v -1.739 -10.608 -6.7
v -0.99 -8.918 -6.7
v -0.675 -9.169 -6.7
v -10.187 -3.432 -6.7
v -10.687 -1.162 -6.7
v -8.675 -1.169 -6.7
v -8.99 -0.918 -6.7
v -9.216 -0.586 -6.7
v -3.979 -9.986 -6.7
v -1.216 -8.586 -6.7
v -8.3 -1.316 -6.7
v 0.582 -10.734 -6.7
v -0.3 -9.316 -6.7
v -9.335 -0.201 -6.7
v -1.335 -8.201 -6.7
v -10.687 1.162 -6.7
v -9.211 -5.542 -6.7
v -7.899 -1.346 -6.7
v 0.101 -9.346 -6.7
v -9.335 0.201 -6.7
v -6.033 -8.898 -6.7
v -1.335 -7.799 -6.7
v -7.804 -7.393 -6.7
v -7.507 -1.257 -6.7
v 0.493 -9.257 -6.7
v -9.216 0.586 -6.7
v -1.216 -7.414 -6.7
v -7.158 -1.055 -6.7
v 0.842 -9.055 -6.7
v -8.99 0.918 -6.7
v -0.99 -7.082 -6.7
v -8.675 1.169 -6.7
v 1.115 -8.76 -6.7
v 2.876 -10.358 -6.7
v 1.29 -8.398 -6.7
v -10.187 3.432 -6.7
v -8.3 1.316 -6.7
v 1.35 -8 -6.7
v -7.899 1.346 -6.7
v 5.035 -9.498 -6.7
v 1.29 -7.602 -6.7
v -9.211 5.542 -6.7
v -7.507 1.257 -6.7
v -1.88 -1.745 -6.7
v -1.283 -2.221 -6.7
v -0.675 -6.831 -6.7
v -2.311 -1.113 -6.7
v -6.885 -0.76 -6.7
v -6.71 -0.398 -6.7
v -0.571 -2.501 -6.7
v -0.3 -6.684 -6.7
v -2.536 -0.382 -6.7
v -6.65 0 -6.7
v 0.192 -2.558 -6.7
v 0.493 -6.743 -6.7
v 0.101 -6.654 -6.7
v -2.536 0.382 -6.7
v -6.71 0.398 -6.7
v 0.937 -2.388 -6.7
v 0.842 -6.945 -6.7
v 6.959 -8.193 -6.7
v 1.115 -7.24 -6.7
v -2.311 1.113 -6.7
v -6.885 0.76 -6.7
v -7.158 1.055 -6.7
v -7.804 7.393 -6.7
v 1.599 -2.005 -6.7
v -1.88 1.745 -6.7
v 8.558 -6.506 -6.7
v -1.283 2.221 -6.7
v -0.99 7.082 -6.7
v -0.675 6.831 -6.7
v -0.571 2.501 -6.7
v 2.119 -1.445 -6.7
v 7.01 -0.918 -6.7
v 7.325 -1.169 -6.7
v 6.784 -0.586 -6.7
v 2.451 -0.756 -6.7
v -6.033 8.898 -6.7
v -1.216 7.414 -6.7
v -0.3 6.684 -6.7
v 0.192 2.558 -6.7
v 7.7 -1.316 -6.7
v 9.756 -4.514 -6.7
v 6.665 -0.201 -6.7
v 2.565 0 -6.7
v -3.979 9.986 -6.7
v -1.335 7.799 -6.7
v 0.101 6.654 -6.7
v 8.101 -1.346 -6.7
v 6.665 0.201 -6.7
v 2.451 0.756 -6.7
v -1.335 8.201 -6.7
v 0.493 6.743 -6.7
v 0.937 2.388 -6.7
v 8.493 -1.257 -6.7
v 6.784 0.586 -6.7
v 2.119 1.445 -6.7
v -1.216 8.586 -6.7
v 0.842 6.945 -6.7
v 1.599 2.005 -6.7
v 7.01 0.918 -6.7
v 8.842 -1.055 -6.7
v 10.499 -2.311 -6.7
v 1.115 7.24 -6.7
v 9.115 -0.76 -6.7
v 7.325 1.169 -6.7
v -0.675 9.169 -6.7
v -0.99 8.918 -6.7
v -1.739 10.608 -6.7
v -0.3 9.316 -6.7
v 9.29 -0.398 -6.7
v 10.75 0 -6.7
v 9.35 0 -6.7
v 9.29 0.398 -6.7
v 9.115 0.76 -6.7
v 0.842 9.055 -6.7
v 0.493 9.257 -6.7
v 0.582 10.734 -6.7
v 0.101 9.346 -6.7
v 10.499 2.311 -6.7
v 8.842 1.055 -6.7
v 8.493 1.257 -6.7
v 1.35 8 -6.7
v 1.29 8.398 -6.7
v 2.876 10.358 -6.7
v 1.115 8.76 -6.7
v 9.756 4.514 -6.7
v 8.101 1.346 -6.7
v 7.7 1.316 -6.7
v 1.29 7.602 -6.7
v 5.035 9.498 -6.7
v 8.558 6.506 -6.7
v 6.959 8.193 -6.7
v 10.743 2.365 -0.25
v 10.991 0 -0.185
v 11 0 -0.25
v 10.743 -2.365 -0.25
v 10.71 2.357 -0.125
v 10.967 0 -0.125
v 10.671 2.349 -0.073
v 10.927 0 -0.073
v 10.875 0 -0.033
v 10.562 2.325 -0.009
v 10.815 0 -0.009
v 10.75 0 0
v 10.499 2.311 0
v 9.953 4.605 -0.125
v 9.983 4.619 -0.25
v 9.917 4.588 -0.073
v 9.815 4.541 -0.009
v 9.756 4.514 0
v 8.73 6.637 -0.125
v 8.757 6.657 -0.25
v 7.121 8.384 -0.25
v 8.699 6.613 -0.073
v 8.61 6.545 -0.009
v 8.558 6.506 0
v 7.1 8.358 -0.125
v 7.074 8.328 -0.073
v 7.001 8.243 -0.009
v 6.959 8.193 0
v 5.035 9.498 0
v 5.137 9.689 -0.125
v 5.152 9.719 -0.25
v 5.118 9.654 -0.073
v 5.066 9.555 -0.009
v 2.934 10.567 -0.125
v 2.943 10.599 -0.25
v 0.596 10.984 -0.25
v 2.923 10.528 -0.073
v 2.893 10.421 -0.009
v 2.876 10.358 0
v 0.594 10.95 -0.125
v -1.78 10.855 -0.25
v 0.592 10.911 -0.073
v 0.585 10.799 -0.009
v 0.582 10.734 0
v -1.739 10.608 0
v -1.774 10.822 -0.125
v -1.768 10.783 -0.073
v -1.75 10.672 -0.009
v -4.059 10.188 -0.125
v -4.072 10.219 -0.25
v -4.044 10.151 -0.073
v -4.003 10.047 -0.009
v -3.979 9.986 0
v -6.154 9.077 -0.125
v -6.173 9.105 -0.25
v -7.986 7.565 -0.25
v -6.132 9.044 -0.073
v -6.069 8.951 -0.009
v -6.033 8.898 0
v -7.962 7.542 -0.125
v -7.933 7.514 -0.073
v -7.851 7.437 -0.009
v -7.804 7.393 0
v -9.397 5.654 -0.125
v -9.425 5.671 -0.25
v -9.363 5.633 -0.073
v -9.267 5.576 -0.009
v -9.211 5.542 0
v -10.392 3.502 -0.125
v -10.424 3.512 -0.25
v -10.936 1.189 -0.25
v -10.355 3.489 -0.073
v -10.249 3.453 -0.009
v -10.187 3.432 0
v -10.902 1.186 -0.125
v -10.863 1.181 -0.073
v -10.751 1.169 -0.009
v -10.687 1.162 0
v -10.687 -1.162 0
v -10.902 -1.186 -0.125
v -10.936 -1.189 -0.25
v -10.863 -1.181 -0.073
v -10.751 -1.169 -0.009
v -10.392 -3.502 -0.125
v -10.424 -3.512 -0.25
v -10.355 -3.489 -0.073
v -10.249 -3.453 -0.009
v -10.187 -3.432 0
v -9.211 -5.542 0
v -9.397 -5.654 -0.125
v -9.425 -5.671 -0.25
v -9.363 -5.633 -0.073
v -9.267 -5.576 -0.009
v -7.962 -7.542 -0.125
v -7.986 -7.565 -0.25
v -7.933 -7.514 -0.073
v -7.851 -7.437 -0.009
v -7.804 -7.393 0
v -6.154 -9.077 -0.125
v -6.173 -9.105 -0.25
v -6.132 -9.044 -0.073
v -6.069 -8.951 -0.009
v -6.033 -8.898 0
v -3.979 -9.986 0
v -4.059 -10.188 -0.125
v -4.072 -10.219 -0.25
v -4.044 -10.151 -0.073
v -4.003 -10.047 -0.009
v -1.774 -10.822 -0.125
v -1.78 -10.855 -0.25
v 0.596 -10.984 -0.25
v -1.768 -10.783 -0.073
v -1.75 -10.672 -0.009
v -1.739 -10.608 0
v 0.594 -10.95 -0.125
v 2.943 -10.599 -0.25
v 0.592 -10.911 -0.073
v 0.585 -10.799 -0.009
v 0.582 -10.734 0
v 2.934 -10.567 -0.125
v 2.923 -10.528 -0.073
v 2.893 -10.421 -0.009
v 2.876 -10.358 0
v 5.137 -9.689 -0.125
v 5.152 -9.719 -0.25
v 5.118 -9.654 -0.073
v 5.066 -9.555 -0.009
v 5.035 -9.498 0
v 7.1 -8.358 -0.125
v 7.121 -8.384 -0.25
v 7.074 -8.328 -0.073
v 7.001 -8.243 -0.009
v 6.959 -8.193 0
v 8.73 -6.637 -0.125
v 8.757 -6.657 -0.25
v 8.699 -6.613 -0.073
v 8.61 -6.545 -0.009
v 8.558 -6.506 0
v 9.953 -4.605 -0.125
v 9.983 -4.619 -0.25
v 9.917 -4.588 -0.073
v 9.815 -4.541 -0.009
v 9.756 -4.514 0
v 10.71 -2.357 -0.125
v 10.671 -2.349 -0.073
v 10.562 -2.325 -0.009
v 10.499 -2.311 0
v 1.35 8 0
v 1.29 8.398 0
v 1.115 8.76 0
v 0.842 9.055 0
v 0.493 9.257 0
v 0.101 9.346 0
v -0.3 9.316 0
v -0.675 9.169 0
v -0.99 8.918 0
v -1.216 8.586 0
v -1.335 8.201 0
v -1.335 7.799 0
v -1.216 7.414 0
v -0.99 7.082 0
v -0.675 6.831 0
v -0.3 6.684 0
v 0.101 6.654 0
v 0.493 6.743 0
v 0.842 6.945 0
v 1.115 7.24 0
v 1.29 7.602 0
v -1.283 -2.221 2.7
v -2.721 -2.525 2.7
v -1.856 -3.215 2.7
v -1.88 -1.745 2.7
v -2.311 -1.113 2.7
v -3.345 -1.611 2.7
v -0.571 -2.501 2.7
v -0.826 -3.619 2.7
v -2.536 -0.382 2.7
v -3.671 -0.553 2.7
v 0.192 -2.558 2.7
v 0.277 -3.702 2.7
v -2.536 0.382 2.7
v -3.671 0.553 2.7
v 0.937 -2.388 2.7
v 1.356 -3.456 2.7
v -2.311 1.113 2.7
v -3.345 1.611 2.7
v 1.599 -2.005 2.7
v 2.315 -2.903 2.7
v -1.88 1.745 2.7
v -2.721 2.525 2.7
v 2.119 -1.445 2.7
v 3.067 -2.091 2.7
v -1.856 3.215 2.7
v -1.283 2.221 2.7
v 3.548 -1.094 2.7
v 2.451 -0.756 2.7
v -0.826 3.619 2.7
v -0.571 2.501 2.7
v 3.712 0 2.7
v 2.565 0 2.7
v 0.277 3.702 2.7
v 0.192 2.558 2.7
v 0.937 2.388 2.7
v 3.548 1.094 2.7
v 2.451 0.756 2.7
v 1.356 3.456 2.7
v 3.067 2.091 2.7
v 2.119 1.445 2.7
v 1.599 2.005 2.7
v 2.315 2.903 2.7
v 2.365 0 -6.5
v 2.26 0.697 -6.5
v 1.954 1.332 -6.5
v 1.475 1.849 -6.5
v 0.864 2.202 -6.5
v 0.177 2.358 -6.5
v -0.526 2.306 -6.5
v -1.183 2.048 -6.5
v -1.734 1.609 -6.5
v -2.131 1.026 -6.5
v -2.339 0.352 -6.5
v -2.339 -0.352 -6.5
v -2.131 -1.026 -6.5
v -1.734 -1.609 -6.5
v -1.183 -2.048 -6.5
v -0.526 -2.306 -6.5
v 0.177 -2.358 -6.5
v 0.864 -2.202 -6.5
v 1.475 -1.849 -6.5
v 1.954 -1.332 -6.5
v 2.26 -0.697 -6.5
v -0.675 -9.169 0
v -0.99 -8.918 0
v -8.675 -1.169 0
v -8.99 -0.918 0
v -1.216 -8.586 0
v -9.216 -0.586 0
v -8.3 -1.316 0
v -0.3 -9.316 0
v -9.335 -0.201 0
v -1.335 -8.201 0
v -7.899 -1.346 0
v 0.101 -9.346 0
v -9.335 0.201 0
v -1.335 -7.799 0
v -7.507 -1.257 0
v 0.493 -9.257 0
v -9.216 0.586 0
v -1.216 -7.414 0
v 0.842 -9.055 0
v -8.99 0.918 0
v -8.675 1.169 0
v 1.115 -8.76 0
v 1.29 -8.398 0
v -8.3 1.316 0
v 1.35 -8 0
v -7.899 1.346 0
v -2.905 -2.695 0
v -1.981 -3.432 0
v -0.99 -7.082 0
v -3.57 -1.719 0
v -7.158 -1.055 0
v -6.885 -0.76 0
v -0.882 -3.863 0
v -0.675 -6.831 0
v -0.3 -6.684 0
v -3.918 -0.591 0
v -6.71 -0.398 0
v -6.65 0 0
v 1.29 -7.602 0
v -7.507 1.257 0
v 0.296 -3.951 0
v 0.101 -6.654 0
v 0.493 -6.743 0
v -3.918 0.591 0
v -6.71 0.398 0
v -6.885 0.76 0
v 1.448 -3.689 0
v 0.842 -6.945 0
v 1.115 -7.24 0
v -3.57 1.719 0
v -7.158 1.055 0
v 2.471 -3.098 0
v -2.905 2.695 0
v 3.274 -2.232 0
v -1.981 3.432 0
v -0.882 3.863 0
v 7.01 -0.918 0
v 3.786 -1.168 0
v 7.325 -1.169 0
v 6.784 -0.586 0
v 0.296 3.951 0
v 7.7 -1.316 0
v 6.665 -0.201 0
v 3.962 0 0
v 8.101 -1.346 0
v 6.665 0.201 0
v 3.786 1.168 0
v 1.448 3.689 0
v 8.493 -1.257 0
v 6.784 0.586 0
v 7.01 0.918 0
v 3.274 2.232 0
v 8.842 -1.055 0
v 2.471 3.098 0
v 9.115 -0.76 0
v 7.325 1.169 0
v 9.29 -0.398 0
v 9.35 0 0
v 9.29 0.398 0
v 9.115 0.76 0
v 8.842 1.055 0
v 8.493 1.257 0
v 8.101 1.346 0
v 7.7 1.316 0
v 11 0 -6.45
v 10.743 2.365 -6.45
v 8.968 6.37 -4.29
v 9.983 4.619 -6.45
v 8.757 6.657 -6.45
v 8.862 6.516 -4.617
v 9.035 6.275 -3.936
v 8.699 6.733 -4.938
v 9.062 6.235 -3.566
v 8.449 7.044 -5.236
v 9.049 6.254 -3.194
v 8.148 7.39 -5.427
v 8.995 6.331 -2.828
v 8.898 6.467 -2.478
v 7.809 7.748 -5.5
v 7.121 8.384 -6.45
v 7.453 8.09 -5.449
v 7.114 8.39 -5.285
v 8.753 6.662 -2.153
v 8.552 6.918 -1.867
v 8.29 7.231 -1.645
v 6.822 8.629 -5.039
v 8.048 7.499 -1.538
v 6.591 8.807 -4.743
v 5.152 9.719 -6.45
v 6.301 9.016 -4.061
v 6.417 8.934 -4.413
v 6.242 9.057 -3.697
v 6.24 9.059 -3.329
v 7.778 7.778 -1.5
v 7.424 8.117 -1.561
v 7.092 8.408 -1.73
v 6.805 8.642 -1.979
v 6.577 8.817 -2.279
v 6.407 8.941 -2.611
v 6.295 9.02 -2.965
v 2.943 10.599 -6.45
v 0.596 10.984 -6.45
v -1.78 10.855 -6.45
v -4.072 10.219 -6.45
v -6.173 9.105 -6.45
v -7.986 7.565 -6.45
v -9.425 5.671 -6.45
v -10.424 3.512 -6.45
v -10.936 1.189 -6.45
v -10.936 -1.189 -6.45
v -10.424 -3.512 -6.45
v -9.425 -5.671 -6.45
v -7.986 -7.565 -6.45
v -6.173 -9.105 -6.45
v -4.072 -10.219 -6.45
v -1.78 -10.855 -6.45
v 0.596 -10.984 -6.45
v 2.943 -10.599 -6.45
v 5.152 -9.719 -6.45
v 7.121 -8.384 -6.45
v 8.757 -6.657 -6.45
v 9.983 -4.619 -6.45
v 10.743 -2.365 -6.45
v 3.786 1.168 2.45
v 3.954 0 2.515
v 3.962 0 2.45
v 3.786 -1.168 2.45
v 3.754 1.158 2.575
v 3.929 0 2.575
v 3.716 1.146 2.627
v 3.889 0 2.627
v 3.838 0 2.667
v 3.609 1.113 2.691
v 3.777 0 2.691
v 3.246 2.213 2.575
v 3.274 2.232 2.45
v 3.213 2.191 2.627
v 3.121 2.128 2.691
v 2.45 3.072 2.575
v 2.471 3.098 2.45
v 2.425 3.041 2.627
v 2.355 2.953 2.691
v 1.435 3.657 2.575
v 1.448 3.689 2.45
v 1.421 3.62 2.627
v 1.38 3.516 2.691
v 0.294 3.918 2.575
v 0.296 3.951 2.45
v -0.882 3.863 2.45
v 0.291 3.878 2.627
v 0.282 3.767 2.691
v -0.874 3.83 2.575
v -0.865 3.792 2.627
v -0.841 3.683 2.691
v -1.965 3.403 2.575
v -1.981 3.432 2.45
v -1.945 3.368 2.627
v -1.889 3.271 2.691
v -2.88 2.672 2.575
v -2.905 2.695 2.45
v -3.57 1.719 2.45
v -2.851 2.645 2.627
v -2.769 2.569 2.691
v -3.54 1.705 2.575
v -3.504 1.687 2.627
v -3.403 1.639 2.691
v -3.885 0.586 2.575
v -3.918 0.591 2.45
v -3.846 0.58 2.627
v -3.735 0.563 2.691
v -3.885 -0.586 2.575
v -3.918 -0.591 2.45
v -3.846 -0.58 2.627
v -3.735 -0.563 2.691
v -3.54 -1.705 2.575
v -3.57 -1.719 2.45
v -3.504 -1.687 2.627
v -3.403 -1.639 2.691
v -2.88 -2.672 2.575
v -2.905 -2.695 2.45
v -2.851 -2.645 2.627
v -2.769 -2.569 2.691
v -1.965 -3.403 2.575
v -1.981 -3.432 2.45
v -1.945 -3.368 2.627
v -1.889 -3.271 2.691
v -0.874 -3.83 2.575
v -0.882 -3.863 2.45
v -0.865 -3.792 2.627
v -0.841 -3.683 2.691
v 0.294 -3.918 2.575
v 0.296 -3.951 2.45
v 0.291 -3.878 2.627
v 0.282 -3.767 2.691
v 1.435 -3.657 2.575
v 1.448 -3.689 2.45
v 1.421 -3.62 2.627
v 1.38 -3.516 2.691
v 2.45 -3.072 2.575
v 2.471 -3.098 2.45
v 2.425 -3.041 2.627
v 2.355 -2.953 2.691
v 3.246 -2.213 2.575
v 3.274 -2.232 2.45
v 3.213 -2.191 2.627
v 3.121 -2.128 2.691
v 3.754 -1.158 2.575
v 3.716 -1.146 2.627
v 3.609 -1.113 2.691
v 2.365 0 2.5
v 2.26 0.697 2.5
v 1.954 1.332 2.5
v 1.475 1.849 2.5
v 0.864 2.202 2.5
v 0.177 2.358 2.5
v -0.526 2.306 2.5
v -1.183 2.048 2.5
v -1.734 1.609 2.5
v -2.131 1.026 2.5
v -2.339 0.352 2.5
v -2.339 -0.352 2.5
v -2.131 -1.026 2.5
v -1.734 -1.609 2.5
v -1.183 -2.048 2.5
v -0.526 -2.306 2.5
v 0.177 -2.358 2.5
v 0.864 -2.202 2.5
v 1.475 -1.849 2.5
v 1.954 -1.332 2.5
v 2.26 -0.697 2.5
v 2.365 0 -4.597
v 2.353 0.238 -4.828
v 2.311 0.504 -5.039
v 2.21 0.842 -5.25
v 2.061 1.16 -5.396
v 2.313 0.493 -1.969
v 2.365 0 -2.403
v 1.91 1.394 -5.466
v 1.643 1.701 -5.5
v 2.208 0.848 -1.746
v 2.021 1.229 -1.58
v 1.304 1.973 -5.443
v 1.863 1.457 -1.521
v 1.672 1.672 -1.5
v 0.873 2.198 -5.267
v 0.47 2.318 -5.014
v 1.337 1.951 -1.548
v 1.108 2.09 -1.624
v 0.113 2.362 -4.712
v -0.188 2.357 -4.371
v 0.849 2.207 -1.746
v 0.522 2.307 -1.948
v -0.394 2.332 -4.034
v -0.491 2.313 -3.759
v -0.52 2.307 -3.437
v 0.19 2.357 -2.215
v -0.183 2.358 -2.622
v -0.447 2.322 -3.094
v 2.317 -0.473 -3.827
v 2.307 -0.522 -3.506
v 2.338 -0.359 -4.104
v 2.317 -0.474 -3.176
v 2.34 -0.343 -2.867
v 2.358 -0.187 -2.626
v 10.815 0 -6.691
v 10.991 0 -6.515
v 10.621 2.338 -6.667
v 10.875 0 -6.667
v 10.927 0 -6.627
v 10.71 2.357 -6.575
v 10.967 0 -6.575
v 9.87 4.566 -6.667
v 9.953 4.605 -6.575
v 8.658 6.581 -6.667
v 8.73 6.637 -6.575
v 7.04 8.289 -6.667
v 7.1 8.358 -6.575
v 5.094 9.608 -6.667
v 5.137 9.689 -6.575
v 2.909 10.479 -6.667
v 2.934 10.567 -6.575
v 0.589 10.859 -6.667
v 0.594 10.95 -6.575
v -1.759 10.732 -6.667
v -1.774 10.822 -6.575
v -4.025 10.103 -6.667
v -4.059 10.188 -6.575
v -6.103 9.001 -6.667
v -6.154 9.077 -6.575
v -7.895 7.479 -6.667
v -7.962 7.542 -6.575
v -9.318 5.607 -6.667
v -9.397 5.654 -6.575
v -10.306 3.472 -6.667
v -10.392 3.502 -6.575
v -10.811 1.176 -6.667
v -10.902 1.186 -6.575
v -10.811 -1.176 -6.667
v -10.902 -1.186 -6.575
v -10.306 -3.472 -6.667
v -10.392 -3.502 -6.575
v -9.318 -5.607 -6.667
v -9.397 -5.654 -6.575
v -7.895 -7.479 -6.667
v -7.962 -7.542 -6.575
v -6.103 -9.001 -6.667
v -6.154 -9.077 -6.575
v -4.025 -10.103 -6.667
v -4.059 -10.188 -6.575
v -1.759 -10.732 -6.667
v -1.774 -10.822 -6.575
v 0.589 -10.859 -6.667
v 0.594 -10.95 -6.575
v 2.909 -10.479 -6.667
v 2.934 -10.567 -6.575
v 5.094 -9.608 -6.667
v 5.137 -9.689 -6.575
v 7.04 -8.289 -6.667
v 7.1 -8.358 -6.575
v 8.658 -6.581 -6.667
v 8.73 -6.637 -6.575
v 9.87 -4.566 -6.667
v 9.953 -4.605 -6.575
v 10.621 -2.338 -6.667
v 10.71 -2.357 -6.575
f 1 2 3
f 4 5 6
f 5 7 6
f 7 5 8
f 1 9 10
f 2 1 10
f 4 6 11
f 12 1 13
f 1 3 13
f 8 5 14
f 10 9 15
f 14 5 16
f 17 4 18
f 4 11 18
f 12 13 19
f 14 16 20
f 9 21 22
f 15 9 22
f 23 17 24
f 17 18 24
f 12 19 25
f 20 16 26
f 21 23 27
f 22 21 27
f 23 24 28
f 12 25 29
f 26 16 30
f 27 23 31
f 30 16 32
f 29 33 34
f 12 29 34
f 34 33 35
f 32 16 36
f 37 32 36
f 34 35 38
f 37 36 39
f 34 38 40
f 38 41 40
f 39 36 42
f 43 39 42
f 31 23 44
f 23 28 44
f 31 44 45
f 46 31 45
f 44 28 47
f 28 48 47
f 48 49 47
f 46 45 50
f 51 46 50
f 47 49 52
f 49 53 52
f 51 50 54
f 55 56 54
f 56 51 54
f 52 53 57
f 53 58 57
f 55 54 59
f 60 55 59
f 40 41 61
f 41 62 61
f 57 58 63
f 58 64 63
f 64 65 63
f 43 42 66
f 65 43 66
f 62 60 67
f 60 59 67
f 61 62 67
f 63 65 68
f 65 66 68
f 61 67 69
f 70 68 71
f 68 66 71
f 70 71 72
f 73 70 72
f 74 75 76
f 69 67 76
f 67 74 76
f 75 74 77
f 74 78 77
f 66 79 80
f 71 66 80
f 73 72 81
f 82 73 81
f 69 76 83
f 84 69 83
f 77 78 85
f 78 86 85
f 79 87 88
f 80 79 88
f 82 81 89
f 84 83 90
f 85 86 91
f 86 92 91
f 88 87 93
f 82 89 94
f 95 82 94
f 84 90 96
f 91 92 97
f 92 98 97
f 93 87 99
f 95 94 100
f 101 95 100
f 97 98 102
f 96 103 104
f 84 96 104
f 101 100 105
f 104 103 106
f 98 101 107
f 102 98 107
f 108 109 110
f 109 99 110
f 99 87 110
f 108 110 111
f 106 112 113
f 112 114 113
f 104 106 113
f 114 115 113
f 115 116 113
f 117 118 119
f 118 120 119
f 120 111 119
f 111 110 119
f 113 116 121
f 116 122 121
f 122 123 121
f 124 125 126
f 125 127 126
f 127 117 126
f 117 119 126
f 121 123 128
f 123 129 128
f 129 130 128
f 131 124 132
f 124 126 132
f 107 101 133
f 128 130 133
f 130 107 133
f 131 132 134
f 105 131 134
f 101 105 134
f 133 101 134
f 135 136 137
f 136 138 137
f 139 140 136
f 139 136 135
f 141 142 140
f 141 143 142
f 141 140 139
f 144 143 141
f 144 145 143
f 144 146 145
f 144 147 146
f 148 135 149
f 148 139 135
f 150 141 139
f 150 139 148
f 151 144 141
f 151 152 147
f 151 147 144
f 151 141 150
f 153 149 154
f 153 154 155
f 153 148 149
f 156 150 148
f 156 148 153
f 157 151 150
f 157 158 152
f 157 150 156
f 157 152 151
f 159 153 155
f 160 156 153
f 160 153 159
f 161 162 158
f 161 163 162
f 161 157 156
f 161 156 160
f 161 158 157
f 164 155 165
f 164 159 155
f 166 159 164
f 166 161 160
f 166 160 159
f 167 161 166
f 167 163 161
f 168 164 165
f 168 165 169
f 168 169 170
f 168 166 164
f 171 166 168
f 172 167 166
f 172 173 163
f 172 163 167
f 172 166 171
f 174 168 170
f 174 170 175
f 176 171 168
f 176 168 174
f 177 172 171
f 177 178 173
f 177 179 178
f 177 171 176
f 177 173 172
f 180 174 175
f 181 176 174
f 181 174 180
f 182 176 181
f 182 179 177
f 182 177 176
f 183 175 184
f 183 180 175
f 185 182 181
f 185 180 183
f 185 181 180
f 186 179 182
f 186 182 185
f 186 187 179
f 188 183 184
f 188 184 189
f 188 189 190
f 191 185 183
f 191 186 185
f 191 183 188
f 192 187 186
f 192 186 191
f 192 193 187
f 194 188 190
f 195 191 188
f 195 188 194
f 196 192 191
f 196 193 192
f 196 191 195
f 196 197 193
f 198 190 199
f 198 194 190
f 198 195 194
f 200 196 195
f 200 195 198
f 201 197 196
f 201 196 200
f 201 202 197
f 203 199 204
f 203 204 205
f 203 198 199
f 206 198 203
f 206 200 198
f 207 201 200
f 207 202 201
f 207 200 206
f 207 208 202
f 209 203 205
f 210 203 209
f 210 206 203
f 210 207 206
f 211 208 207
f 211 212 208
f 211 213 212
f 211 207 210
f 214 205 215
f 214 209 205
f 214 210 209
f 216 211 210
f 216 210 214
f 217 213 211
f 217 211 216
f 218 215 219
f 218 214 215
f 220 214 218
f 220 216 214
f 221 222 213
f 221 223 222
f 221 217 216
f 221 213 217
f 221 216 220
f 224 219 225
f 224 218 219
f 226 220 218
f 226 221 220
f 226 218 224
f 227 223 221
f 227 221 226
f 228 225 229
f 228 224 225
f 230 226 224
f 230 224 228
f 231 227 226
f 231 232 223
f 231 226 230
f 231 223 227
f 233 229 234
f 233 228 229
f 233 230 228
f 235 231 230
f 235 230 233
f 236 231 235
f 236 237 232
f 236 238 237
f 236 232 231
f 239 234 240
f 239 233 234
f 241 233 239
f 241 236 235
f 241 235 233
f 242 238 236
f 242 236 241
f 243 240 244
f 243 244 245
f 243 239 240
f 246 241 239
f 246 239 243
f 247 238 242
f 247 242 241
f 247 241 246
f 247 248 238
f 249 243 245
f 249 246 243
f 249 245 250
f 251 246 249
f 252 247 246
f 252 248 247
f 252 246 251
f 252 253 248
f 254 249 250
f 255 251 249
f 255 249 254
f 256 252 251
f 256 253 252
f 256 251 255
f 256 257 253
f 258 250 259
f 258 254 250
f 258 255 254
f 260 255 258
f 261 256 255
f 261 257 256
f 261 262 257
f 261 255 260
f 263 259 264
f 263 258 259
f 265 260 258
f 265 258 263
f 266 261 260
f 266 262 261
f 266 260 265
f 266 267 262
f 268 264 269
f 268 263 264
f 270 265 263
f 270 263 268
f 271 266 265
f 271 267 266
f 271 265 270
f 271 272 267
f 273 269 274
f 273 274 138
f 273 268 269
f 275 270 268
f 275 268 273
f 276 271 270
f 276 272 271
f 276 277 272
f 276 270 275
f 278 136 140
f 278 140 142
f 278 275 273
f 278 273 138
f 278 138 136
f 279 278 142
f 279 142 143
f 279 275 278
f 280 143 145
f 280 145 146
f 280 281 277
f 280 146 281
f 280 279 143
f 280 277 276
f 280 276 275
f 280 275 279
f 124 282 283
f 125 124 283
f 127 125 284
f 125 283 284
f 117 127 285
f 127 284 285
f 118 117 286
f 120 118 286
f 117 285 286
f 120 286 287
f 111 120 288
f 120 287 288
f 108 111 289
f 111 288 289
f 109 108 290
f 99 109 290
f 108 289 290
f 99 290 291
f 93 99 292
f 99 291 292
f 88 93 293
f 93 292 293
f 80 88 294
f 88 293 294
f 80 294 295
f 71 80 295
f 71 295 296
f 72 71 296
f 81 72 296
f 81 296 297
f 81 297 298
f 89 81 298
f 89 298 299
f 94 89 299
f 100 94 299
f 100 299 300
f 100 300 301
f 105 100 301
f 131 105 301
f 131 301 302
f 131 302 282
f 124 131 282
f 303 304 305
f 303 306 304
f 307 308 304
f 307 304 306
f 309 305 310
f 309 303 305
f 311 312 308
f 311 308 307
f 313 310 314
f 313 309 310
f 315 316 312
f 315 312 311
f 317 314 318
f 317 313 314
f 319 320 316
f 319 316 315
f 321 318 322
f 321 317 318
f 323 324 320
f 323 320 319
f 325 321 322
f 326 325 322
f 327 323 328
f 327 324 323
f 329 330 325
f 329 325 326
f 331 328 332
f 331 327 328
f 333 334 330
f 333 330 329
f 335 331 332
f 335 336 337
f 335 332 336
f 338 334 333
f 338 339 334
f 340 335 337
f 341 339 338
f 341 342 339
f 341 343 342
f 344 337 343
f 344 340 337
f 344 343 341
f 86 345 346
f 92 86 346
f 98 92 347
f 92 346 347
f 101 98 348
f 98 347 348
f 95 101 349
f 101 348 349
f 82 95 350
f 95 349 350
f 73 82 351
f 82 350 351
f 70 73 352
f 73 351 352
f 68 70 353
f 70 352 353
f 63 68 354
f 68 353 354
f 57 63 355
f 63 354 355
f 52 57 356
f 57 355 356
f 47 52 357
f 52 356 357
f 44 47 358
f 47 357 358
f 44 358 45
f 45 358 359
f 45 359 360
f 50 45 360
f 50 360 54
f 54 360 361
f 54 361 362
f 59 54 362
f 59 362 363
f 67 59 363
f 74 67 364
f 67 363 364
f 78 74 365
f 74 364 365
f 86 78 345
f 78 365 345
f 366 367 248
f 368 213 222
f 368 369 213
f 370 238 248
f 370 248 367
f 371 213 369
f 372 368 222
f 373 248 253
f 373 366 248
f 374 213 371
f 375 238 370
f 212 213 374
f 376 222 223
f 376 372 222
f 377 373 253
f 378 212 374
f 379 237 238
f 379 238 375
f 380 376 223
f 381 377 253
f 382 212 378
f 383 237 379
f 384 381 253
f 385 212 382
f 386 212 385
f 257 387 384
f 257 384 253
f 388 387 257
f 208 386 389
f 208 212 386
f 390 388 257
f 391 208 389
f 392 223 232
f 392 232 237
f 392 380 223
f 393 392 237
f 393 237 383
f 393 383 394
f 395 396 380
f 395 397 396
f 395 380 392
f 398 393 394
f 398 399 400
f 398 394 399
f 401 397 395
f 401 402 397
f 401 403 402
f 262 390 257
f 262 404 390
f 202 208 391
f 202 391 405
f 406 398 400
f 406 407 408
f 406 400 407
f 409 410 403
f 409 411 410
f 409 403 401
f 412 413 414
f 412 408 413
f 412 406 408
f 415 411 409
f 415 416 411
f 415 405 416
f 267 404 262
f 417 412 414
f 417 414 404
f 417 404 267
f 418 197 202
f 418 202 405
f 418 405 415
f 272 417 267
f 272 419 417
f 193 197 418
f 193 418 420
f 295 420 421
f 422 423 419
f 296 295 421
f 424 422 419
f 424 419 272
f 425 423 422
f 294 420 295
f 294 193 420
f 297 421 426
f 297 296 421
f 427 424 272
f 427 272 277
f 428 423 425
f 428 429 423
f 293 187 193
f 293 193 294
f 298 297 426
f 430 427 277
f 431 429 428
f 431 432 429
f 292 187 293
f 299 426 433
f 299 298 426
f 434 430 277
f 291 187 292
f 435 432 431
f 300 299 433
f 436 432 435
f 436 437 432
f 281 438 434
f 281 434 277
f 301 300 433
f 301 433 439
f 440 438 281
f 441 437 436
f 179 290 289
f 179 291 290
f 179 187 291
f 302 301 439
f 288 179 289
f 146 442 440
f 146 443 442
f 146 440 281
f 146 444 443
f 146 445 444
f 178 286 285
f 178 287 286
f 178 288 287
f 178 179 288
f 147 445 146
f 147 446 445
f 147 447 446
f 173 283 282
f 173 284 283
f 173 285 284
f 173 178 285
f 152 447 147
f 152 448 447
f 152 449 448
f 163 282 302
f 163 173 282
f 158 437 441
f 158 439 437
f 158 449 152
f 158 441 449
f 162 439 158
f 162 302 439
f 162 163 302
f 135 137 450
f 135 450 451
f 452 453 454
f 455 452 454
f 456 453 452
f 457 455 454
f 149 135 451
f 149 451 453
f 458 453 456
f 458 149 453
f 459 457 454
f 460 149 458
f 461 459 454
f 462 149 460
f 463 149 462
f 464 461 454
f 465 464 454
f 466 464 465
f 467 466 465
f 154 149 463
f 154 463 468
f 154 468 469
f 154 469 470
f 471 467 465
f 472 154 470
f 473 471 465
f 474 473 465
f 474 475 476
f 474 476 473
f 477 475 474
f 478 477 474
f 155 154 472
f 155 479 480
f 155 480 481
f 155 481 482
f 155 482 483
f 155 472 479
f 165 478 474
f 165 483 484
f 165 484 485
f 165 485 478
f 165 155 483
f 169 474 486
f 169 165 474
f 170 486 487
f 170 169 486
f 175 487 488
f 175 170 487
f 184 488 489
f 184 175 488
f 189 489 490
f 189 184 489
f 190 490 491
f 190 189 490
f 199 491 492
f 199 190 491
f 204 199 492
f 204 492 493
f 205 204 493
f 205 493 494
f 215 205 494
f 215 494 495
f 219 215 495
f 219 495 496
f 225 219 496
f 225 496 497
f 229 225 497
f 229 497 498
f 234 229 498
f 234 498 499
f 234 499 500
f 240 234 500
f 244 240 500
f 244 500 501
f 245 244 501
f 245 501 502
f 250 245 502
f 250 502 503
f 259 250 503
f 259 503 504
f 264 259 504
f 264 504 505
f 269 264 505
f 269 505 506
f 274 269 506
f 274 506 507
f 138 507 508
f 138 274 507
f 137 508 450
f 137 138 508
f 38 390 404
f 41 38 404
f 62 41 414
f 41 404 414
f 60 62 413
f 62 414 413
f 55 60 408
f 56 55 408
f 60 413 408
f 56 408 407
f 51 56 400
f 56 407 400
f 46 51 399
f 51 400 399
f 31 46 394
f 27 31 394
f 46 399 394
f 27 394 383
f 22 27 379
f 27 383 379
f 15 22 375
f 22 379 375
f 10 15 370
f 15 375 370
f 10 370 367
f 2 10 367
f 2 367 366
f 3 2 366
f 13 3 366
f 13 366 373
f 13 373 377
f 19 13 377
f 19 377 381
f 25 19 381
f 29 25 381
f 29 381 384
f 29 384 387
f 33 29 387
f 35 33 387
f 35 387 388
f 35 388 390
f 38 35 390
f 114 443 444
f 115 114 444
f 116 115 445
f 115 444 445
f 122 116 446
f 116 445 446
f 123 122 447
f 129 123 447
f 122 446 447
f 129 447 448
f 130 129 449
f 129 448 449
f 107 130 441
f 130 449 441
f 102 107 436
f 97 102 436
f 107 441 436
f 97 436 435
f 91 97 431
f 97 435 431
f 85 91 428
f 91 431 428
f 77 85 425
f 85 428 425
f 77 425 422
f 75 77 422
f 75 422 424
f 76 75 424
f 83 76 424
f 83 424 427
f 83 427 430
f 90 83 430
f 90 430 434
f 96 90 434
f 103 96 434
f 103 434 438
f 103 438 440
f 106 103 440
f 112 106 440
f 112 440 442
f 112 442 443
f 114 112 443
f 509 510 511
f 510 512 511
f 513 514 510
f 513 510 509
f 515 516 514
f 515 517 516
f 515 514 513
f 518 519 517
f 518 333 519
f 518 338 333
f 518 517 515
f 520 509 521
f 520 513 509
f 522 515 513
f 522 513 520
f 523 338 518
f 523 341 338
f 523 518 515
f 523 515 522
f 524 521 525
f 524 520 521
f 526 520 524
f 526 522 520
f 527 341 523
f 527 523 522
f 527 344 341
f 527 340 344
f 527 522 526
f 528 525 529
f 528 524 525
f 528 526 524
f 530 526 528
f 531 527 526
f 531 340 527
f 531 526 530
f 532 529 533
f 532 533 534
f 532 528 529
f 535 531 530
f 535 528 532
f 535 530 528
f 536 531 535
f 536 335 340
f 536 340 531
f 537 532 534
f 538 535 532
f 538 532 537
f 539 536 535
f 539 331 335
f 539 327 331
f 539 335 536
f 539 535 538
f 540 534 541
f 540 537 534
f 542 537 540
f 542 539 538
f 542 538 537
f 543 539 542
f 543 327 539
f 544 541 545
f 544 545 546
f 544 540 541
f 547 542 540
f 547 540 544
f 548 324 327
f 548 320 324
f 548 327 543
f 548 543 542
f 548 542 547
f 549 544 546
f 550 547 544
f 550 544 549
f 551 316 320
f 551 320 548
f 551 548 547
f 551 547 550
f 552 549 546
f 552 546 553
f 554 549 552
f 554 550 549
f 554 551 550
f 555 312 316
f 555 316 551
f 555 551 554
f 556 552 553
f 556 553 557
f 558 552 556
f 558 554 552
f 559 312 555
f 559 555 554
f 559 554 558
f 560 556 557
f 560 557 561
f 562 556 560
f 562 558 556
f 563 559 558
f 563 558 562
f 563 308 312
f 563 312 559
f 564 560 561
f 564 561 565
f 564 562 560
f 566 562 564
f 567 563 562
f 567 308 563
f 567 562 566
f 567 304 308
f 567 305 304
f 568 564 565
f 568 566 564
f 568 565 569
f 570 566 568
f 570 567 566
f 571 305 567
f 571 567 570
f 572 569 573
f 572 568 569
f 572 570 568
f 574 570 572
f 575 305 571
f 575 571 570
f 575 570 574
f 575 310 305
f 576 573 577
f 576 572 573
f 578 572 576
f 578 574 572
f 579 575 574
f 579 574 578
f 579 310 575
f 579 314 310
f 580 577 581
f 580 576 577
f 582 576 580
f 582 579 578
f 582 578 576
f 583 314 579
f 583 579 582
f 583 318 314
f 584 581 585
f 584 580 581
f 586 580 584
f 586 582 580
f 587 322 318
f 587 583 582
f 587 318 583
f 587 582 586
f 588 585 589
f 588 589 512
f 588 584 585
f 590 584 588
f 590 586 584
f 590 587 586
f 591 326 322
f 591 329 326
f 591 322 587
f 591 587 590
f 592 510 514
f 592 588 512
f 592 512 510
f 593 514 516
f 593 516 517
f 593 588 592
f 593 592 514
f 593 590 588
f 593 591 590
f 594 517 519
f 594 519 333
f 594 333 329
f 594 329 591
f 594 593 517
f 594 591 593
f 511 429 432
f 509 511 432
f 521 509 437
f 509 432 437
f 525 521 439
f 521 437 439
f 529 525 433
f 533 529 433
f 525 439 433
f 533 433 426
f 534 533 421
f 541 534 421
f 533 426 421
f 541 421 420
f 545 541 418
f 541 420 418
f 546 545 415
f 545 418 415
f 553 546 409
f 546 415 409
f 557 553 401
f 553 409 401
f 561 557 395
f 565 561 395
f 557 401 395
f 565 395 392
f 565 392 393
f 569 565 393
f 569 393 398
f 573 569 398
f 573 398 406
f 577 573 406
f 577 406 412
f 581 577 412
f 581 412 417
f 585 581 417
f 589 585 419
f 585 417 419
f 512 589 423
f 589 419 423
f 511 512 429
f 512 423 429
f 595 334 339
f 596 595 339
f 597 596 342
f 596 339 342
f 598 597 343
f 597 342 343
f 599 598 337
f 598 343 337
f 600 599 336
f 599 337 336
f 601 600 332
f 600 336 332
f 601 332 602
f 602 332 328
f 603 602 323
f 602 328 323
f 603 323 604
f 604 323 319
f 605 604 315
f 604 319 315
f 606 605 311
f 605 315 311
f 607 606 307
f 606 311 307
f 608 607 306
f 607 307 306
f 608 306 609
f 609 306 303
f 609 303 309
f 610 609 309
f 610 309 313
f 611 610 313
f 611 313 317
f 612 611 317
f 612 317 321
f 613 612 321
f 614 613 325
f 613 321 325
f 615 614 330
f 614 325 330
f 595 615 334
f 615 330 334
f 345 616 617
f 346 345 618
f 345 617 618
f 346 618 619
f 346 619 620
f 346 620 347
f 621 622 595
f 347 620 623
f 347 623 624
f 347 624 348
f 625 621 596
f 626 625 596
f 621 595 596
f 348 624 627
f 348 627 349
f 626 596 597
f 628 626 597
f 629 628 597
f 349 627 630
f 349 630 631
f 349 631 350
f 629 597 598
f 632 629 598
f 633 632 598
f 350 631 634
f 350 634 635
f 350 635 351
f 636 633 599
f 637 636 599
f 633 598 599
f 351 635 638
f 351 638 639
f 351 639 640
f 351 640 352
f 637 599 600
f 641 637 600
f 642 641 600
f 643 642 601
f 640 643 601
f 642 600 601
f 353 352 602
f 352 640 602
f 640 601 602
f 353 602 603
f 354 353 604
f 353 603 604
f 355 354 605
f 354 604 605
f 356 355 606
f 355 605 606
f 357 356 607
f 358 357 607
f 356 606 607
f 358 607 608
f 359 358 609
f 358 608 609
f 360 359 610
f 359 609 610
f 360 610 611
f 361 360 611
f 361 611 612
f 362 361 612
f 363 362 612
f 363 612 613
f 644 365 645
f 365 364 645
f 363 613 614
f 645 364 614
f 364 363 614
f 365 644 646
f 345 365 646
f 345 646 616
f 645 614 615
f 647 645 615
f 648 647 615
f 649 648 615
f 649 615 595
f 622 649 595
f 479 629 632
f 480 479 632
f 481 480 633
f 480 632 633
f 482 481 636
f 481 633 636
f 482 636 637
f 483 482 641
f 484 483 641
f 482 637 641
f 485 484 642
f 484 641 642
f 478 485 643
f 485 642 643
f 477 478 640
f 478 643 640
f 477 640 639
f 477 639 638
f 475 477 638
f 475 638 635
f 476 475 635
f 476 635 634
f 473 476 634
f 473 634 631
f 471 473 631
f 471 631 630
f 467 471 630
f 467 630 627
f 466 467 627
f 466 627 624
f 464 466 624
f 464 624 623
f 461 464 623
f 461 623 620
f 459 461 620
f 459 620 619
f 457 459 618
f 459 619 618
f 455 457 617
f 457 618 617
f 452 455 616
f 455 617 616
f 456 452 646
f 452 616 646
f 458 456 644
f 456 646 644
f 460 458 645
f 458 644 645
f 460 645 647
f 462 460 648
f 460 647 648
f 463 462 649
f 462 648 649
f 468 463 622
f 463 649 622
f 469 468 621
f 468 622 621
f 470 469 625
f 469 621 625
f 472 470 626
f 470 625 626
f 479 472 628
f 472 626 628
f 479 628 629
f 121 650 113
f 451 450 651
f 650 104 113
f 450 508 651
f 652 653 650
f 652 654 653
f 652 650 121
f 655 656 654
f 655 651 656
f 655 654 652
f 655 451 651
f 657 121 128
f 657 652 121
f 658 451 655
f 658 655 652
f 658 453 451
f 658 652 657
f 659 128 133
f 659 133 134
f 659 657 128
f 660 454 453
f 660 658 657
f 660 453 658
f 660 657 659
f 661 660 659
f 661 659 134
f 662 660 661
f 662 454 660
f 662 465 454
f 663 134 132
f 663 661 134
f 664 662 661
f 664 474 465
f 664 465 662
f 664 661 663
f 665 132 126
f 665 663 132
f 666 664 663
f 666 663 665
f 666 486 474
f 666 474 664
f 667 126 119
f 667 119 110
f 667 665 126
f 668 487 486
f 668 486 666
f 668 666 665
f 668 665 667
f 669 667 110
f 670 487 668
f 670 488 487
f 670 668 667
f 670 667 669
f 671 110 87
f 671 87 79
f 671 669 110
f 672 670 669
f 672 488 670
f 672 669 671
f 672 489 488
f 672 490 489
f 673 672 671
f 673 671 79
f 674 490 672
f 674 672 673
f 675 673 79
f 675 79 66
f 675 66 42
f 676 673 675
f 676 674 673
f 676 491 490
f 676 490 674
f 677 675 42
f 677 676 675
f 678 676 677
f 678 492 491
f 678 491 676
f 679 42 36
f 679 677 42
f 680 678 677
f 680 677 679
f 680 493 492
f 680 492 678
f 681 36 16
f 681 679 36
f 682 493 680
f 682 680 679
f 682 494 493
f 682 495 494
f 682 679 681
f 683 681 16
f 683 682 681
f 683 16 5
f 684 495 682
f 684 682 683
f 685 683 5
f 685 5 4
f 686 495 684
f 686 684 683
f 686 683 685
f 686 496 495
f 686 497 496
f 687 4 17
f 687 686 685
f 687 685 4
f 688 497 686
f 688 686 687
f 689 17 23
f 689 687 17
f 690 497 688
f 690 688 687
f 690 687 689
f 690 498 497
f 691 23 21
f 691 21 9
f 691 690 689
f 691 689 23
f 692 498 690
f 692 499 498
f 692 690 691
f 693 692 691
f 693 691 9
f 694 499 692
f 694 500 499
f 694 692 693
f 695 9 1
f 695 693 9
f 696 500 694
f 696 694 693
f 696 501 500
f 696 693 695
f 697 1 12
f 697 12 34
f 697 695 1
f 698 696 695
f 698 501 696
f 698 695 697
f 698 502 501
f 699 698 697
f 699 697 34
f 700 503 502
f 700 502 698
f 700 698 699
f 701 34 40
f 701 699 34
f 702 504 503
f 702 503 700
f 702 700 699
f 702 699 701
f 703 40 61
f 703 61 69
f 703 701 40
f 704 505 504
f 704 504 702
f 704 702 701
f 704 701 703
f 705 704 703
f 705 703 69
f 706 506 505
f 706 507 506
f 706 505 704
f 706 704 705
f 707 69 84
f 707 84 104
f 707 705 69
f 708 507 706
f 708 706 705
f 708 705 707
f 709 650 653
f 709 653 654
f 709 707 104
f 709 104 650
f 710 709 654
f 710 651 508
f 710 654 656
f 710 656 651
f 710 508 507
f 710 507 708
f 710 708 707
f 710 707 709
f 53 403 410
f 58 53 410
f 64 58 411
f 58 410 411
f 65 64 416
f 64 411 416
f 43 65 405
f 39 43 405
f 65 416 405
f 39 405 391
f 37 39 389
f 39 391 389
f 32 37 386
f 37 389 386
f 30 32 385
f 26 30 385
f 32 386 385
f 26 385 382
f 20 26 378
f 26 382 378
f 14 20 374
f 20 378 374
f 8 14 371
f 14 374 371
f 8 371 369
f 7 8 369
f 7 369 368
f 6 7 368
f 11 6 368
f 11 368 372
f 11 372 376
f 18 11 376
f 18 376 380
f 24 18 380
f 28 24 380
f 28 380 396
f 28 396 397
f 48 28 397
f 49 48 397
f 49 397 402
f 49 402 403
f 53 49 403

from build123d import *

# Parameters (mm, degrees)
SKETCH1_R           = 11
BOSS_EXTRUDE1_DEPTH = 6.7
SKETCH2_R           = 3.9625
BOSS_EXTRUDE2_DEPTH = 2.7
SKETCH3_R           = 2.365
CUT_EXTRUDE1_DEPTH  = 10.4
SKETCH4_R           = 1.35
CUT_EXTRUDE2_DEPTH  = 7.7
SKETCH6_R           = 2
CUT_EXTRUDE3_DEPTH  = 16.556349186
CHAMFER1_SIZE       = 0.2
FILLET1_R           = 0.25


with BuildPart() as part:
    # Sketch1 → Boss-Extrude1 (new body)
    with BuildSketch(Plane.XY):
        Circle(SKETCH1_R)
    extrude(amount=-BOSS_EXTRUDE1_DEPTH)

    # Sketch2 → Boss-Extrude2 (add)
    with BuildSketch(Plane.XY):
        Circle(SKETCH2_R)
    extrude(amount=BOSS_EXTRUDE2_DEPTH)

    # Sketch3 → Cut-Extrude1 (cut, through all)
    with BuildSketch(Plane.XY.offset(2.7)):
        Circle(SKETCH3_R)
    extrude(amount=-CUT_EXTRUDE1_DEPTH, mode=Mode.SUBTRACT)

    # Sketch4 → Cut-Extrude2 (cut, through all)
    with BuildSketch(Plane.XY):
        with Locations((0, 8)):
            Circle(SKETCH4_R)
        with Locations((8, 0)):
            Circle(SKETCH4_R)
        with Locations((0, -8)):
            Circle(SKETCH4_R)
        with Locations((-8, 0)):
            Circle(SKETCH4_R)
    extrude(amount=-CUT_EXTRUDE2_DEPTH, mode=Mode.SUBTRACT)

    # Sketch6 → Cut-Extrude3 (cut, through all)
    with BuildSketch(Plane(origin=(0, 0, 0), x_dir=(0, 0, 1), z_dir=(-0.707106781, -0.707106781, 0))):
        with Locations((-3.5, 0)):
            Circle(SKETCH6_R)
    extrude(amount=-CUT_EXTRUDE3_DEPTH, mode=Mode.SUBTRACT)

    # Chamfer1
    chamfer1_edges = [part.edges().sort_by_distance(p)[0] for p in [
        (-2.365, 0, -6.7),
        (-2.365, 0, 2.7),
    ]]
    chamfer(chamfer1_edges, length=CHAMFER1_SIZE)

    # Fillet1
    fillet1_edges = [part.edges().sort_by_distance(p)[0] for p in [
        (-11, 0, 0),
        (-11, 0, -6.7),
        (-3.9625, 0, 2.7),
    ]]
    fillet(fillet1_edges, radius=FILLET1_R)


solid = part.part
